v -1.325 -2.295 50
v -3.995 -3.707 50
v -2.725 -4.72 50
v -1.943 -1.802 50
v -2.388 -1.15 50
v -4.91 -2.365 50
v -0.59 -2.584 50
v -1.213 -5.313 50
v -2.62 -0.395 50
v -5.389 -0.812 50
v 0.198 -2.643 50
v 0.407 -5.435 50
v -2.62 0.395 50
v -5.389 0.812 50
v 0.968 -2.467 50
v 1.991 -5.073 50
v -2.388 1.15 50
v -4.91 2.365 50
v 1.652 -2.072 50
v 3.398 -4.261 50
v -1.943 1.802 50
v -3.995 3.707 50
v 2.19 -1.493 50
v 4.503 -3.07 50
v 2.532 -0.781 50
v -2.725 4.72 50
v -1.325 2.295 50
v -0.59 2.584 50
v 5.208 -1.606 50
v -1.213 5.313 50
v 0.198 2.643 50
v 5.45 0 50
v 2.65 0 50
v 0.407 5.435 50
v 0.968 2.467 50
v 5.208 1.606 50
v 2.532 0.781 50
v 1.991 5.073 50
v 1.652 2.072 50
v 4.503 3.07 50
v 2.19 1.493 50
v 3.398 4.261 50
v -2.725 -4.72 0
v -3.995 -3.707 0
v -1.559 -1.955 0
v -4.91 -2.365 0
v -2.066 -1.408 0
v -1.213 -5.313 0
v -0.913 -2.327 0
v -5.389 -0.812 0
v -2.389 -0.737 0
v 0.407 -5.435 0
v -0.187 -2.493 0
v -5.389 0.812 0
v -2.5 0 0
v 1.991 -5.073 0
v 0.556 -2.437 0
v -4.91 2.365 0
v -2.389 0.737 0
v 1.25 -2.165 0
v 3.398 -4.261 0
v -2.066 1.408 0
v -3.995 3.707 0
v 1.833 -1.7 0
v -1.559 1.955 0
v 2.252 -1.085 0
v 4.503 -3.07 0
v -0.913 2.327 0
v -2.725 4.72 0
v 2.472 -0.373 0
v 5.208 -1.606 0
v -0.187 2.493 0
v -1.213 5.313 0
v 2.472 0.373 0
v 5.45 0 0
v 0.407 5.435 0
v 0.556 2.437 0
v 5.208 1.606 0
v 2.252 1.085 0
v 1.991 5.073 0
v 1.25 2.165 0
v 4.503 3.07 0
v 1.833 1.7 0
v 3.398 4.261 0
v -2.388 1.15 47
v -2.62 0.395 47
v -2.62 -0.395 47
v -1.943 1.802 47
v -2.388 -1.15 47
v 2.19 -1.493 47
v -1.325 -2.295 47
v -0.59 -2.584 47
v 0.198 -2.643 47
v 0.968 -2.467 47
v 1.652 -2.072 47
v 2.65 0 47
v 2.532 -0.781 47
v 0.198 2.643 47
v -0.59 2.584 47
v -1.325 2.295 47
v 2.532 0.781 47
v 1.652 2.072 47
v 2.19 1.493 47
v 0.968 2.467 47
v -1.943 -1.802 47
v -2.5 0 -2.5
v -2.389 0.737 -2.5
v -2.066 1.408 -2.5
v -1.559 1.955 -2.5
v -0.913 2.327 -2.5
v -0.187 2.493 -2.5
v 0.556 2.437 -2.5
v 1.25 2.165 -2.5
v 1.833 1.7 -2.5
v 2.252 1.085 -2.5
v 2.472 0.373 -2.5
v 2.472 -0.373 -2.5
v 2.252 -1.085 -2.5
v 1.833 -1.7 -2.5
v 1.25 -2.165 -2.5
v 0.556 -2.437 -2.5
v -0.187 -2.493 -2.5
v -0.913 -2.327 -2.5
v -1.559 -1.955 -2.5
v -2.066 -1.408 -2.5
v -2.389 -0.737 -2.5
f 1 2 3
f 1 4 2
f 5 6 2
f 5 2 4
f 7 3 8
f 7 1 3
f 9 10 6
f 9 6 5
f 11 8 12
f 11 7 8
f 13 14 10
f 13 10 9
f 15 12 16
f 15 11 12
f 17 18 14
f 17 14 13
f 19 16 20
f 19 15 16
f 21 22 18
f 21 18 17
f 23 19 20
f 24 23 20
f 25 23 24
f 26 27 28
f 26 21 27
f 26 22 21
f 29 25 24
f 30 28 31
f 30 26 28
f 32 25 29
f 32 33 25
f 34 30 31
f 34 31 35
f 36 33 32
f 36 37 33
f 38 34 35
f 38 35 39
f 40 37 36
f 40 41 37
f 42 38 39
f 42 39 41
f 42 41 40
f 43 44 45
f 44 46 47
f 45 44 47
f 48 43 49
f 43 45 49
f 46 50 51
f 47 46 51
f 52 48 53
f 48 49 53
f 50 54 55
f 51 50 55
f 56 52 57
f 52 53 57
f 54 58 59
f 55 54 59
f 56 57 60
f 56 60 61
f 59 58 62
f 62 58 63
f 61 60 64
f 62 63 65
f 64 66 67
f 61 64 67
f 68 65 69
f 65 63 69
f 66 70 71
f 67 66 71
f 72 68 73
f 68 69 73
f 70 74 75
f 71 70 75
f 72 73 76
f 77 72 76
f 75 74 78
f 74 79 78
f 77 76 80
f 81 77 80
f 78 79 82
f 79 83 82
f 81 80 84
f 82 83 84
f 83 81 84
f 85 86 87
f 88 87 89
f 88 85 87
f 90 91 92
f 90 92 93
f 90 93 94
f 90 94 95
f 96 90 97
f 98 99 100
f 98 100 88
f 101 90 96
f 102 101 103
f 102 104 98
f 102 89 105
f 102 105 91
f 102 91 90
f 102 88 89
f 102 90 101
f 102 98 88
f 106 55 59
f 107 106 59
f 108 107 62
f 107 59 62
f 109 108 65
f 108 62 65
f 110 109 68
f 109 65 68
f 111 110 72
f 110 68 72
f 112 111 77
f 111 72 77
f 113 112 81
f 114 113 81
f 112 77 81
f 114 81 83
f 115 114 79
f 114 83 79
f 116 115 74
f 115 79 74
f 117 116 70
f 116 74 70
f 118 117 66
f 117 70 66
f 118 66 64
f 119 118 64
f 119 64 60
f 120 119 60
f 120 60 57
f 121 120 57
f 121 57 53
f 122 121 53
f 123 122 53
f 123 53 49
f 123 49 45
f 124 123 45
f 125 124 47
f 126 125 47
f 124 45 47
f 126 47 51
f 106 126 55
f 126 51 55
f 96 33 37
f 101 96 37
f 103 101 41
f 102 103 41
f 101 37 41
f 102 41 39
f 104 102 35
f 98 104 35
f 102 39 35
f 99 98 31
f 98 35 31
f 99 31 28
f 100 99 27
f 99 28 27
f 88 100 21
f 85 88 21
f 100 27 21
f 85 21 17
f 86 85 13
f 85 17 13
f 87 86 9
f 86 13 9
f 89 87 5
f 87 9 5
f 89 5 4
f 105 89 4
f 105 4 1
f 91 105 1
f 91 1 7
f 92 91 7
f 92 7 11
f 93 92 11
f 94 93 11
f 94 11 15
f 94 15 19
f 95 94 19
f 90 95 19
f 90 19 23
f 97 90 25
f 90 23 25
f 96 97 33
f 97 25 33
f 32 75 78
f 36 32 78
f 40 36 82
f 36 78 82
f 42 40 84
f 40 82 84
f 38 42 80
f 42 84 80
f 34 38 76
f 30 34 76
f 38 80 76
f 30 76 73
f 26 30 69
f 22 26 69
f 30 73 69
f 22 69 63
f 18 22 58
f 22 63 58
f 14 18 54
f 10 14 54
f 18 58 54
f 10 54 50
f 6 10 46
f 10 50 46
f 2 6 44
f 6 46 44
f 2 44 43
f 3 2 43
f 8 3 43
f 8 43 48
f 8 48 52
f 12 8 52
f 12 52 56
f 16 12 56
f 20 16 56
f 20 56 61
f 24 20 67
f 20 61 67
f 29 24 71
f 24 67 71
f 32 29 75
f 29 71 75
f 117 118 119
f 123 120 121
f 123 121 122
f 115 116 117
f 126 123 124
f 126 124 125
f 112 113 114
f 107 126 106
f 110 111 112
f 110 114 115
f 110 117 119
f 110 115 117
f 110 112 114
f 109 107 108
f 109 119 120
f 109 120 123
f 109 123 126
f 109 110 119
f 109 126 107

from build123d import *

# Parameters (mm, degrees)
SKETCH1_R           = 5.45
BOSS_EXTRUDE1_DEPTH = 50
SKETCH6_R           = 2.5
BOSS_EXTRUDE2_DEPTH = 2.5
SKETCH7_R           = 2.65
CUT_EXTRUDE1_DEPTH  = 3


with BuildPart() as part:
    # Sketch1 → Boss-Extrude1 (new body)
    with BuildSketch(Plane.XY):
        Circle(SKETCH1_R)
    extrude(amount=BOSS_EXTRUDE1_DEPTH)

    # Sketch6 → Boss-Extrude2 (add)
    with BuildSketch(Plane(origin=(0, 0, 0), x_dir=(-1, 0, 0), z_dir=(0, 0, -1))):
        Circle(SKETCH6_R)
    extrude(amount=BOSS_EXTRUDE2_DEPTH)

    # Sketch7 → Cut-Extrude1 (cut)
    with BuildSketch(Plane.XY.offset(50)):
        Circle(SKETCH7_R)
    extrude(amount=-CUT_EXTRUDE1_DEPTH, mode=Mode.SUBTRACT)


solid = part.part
